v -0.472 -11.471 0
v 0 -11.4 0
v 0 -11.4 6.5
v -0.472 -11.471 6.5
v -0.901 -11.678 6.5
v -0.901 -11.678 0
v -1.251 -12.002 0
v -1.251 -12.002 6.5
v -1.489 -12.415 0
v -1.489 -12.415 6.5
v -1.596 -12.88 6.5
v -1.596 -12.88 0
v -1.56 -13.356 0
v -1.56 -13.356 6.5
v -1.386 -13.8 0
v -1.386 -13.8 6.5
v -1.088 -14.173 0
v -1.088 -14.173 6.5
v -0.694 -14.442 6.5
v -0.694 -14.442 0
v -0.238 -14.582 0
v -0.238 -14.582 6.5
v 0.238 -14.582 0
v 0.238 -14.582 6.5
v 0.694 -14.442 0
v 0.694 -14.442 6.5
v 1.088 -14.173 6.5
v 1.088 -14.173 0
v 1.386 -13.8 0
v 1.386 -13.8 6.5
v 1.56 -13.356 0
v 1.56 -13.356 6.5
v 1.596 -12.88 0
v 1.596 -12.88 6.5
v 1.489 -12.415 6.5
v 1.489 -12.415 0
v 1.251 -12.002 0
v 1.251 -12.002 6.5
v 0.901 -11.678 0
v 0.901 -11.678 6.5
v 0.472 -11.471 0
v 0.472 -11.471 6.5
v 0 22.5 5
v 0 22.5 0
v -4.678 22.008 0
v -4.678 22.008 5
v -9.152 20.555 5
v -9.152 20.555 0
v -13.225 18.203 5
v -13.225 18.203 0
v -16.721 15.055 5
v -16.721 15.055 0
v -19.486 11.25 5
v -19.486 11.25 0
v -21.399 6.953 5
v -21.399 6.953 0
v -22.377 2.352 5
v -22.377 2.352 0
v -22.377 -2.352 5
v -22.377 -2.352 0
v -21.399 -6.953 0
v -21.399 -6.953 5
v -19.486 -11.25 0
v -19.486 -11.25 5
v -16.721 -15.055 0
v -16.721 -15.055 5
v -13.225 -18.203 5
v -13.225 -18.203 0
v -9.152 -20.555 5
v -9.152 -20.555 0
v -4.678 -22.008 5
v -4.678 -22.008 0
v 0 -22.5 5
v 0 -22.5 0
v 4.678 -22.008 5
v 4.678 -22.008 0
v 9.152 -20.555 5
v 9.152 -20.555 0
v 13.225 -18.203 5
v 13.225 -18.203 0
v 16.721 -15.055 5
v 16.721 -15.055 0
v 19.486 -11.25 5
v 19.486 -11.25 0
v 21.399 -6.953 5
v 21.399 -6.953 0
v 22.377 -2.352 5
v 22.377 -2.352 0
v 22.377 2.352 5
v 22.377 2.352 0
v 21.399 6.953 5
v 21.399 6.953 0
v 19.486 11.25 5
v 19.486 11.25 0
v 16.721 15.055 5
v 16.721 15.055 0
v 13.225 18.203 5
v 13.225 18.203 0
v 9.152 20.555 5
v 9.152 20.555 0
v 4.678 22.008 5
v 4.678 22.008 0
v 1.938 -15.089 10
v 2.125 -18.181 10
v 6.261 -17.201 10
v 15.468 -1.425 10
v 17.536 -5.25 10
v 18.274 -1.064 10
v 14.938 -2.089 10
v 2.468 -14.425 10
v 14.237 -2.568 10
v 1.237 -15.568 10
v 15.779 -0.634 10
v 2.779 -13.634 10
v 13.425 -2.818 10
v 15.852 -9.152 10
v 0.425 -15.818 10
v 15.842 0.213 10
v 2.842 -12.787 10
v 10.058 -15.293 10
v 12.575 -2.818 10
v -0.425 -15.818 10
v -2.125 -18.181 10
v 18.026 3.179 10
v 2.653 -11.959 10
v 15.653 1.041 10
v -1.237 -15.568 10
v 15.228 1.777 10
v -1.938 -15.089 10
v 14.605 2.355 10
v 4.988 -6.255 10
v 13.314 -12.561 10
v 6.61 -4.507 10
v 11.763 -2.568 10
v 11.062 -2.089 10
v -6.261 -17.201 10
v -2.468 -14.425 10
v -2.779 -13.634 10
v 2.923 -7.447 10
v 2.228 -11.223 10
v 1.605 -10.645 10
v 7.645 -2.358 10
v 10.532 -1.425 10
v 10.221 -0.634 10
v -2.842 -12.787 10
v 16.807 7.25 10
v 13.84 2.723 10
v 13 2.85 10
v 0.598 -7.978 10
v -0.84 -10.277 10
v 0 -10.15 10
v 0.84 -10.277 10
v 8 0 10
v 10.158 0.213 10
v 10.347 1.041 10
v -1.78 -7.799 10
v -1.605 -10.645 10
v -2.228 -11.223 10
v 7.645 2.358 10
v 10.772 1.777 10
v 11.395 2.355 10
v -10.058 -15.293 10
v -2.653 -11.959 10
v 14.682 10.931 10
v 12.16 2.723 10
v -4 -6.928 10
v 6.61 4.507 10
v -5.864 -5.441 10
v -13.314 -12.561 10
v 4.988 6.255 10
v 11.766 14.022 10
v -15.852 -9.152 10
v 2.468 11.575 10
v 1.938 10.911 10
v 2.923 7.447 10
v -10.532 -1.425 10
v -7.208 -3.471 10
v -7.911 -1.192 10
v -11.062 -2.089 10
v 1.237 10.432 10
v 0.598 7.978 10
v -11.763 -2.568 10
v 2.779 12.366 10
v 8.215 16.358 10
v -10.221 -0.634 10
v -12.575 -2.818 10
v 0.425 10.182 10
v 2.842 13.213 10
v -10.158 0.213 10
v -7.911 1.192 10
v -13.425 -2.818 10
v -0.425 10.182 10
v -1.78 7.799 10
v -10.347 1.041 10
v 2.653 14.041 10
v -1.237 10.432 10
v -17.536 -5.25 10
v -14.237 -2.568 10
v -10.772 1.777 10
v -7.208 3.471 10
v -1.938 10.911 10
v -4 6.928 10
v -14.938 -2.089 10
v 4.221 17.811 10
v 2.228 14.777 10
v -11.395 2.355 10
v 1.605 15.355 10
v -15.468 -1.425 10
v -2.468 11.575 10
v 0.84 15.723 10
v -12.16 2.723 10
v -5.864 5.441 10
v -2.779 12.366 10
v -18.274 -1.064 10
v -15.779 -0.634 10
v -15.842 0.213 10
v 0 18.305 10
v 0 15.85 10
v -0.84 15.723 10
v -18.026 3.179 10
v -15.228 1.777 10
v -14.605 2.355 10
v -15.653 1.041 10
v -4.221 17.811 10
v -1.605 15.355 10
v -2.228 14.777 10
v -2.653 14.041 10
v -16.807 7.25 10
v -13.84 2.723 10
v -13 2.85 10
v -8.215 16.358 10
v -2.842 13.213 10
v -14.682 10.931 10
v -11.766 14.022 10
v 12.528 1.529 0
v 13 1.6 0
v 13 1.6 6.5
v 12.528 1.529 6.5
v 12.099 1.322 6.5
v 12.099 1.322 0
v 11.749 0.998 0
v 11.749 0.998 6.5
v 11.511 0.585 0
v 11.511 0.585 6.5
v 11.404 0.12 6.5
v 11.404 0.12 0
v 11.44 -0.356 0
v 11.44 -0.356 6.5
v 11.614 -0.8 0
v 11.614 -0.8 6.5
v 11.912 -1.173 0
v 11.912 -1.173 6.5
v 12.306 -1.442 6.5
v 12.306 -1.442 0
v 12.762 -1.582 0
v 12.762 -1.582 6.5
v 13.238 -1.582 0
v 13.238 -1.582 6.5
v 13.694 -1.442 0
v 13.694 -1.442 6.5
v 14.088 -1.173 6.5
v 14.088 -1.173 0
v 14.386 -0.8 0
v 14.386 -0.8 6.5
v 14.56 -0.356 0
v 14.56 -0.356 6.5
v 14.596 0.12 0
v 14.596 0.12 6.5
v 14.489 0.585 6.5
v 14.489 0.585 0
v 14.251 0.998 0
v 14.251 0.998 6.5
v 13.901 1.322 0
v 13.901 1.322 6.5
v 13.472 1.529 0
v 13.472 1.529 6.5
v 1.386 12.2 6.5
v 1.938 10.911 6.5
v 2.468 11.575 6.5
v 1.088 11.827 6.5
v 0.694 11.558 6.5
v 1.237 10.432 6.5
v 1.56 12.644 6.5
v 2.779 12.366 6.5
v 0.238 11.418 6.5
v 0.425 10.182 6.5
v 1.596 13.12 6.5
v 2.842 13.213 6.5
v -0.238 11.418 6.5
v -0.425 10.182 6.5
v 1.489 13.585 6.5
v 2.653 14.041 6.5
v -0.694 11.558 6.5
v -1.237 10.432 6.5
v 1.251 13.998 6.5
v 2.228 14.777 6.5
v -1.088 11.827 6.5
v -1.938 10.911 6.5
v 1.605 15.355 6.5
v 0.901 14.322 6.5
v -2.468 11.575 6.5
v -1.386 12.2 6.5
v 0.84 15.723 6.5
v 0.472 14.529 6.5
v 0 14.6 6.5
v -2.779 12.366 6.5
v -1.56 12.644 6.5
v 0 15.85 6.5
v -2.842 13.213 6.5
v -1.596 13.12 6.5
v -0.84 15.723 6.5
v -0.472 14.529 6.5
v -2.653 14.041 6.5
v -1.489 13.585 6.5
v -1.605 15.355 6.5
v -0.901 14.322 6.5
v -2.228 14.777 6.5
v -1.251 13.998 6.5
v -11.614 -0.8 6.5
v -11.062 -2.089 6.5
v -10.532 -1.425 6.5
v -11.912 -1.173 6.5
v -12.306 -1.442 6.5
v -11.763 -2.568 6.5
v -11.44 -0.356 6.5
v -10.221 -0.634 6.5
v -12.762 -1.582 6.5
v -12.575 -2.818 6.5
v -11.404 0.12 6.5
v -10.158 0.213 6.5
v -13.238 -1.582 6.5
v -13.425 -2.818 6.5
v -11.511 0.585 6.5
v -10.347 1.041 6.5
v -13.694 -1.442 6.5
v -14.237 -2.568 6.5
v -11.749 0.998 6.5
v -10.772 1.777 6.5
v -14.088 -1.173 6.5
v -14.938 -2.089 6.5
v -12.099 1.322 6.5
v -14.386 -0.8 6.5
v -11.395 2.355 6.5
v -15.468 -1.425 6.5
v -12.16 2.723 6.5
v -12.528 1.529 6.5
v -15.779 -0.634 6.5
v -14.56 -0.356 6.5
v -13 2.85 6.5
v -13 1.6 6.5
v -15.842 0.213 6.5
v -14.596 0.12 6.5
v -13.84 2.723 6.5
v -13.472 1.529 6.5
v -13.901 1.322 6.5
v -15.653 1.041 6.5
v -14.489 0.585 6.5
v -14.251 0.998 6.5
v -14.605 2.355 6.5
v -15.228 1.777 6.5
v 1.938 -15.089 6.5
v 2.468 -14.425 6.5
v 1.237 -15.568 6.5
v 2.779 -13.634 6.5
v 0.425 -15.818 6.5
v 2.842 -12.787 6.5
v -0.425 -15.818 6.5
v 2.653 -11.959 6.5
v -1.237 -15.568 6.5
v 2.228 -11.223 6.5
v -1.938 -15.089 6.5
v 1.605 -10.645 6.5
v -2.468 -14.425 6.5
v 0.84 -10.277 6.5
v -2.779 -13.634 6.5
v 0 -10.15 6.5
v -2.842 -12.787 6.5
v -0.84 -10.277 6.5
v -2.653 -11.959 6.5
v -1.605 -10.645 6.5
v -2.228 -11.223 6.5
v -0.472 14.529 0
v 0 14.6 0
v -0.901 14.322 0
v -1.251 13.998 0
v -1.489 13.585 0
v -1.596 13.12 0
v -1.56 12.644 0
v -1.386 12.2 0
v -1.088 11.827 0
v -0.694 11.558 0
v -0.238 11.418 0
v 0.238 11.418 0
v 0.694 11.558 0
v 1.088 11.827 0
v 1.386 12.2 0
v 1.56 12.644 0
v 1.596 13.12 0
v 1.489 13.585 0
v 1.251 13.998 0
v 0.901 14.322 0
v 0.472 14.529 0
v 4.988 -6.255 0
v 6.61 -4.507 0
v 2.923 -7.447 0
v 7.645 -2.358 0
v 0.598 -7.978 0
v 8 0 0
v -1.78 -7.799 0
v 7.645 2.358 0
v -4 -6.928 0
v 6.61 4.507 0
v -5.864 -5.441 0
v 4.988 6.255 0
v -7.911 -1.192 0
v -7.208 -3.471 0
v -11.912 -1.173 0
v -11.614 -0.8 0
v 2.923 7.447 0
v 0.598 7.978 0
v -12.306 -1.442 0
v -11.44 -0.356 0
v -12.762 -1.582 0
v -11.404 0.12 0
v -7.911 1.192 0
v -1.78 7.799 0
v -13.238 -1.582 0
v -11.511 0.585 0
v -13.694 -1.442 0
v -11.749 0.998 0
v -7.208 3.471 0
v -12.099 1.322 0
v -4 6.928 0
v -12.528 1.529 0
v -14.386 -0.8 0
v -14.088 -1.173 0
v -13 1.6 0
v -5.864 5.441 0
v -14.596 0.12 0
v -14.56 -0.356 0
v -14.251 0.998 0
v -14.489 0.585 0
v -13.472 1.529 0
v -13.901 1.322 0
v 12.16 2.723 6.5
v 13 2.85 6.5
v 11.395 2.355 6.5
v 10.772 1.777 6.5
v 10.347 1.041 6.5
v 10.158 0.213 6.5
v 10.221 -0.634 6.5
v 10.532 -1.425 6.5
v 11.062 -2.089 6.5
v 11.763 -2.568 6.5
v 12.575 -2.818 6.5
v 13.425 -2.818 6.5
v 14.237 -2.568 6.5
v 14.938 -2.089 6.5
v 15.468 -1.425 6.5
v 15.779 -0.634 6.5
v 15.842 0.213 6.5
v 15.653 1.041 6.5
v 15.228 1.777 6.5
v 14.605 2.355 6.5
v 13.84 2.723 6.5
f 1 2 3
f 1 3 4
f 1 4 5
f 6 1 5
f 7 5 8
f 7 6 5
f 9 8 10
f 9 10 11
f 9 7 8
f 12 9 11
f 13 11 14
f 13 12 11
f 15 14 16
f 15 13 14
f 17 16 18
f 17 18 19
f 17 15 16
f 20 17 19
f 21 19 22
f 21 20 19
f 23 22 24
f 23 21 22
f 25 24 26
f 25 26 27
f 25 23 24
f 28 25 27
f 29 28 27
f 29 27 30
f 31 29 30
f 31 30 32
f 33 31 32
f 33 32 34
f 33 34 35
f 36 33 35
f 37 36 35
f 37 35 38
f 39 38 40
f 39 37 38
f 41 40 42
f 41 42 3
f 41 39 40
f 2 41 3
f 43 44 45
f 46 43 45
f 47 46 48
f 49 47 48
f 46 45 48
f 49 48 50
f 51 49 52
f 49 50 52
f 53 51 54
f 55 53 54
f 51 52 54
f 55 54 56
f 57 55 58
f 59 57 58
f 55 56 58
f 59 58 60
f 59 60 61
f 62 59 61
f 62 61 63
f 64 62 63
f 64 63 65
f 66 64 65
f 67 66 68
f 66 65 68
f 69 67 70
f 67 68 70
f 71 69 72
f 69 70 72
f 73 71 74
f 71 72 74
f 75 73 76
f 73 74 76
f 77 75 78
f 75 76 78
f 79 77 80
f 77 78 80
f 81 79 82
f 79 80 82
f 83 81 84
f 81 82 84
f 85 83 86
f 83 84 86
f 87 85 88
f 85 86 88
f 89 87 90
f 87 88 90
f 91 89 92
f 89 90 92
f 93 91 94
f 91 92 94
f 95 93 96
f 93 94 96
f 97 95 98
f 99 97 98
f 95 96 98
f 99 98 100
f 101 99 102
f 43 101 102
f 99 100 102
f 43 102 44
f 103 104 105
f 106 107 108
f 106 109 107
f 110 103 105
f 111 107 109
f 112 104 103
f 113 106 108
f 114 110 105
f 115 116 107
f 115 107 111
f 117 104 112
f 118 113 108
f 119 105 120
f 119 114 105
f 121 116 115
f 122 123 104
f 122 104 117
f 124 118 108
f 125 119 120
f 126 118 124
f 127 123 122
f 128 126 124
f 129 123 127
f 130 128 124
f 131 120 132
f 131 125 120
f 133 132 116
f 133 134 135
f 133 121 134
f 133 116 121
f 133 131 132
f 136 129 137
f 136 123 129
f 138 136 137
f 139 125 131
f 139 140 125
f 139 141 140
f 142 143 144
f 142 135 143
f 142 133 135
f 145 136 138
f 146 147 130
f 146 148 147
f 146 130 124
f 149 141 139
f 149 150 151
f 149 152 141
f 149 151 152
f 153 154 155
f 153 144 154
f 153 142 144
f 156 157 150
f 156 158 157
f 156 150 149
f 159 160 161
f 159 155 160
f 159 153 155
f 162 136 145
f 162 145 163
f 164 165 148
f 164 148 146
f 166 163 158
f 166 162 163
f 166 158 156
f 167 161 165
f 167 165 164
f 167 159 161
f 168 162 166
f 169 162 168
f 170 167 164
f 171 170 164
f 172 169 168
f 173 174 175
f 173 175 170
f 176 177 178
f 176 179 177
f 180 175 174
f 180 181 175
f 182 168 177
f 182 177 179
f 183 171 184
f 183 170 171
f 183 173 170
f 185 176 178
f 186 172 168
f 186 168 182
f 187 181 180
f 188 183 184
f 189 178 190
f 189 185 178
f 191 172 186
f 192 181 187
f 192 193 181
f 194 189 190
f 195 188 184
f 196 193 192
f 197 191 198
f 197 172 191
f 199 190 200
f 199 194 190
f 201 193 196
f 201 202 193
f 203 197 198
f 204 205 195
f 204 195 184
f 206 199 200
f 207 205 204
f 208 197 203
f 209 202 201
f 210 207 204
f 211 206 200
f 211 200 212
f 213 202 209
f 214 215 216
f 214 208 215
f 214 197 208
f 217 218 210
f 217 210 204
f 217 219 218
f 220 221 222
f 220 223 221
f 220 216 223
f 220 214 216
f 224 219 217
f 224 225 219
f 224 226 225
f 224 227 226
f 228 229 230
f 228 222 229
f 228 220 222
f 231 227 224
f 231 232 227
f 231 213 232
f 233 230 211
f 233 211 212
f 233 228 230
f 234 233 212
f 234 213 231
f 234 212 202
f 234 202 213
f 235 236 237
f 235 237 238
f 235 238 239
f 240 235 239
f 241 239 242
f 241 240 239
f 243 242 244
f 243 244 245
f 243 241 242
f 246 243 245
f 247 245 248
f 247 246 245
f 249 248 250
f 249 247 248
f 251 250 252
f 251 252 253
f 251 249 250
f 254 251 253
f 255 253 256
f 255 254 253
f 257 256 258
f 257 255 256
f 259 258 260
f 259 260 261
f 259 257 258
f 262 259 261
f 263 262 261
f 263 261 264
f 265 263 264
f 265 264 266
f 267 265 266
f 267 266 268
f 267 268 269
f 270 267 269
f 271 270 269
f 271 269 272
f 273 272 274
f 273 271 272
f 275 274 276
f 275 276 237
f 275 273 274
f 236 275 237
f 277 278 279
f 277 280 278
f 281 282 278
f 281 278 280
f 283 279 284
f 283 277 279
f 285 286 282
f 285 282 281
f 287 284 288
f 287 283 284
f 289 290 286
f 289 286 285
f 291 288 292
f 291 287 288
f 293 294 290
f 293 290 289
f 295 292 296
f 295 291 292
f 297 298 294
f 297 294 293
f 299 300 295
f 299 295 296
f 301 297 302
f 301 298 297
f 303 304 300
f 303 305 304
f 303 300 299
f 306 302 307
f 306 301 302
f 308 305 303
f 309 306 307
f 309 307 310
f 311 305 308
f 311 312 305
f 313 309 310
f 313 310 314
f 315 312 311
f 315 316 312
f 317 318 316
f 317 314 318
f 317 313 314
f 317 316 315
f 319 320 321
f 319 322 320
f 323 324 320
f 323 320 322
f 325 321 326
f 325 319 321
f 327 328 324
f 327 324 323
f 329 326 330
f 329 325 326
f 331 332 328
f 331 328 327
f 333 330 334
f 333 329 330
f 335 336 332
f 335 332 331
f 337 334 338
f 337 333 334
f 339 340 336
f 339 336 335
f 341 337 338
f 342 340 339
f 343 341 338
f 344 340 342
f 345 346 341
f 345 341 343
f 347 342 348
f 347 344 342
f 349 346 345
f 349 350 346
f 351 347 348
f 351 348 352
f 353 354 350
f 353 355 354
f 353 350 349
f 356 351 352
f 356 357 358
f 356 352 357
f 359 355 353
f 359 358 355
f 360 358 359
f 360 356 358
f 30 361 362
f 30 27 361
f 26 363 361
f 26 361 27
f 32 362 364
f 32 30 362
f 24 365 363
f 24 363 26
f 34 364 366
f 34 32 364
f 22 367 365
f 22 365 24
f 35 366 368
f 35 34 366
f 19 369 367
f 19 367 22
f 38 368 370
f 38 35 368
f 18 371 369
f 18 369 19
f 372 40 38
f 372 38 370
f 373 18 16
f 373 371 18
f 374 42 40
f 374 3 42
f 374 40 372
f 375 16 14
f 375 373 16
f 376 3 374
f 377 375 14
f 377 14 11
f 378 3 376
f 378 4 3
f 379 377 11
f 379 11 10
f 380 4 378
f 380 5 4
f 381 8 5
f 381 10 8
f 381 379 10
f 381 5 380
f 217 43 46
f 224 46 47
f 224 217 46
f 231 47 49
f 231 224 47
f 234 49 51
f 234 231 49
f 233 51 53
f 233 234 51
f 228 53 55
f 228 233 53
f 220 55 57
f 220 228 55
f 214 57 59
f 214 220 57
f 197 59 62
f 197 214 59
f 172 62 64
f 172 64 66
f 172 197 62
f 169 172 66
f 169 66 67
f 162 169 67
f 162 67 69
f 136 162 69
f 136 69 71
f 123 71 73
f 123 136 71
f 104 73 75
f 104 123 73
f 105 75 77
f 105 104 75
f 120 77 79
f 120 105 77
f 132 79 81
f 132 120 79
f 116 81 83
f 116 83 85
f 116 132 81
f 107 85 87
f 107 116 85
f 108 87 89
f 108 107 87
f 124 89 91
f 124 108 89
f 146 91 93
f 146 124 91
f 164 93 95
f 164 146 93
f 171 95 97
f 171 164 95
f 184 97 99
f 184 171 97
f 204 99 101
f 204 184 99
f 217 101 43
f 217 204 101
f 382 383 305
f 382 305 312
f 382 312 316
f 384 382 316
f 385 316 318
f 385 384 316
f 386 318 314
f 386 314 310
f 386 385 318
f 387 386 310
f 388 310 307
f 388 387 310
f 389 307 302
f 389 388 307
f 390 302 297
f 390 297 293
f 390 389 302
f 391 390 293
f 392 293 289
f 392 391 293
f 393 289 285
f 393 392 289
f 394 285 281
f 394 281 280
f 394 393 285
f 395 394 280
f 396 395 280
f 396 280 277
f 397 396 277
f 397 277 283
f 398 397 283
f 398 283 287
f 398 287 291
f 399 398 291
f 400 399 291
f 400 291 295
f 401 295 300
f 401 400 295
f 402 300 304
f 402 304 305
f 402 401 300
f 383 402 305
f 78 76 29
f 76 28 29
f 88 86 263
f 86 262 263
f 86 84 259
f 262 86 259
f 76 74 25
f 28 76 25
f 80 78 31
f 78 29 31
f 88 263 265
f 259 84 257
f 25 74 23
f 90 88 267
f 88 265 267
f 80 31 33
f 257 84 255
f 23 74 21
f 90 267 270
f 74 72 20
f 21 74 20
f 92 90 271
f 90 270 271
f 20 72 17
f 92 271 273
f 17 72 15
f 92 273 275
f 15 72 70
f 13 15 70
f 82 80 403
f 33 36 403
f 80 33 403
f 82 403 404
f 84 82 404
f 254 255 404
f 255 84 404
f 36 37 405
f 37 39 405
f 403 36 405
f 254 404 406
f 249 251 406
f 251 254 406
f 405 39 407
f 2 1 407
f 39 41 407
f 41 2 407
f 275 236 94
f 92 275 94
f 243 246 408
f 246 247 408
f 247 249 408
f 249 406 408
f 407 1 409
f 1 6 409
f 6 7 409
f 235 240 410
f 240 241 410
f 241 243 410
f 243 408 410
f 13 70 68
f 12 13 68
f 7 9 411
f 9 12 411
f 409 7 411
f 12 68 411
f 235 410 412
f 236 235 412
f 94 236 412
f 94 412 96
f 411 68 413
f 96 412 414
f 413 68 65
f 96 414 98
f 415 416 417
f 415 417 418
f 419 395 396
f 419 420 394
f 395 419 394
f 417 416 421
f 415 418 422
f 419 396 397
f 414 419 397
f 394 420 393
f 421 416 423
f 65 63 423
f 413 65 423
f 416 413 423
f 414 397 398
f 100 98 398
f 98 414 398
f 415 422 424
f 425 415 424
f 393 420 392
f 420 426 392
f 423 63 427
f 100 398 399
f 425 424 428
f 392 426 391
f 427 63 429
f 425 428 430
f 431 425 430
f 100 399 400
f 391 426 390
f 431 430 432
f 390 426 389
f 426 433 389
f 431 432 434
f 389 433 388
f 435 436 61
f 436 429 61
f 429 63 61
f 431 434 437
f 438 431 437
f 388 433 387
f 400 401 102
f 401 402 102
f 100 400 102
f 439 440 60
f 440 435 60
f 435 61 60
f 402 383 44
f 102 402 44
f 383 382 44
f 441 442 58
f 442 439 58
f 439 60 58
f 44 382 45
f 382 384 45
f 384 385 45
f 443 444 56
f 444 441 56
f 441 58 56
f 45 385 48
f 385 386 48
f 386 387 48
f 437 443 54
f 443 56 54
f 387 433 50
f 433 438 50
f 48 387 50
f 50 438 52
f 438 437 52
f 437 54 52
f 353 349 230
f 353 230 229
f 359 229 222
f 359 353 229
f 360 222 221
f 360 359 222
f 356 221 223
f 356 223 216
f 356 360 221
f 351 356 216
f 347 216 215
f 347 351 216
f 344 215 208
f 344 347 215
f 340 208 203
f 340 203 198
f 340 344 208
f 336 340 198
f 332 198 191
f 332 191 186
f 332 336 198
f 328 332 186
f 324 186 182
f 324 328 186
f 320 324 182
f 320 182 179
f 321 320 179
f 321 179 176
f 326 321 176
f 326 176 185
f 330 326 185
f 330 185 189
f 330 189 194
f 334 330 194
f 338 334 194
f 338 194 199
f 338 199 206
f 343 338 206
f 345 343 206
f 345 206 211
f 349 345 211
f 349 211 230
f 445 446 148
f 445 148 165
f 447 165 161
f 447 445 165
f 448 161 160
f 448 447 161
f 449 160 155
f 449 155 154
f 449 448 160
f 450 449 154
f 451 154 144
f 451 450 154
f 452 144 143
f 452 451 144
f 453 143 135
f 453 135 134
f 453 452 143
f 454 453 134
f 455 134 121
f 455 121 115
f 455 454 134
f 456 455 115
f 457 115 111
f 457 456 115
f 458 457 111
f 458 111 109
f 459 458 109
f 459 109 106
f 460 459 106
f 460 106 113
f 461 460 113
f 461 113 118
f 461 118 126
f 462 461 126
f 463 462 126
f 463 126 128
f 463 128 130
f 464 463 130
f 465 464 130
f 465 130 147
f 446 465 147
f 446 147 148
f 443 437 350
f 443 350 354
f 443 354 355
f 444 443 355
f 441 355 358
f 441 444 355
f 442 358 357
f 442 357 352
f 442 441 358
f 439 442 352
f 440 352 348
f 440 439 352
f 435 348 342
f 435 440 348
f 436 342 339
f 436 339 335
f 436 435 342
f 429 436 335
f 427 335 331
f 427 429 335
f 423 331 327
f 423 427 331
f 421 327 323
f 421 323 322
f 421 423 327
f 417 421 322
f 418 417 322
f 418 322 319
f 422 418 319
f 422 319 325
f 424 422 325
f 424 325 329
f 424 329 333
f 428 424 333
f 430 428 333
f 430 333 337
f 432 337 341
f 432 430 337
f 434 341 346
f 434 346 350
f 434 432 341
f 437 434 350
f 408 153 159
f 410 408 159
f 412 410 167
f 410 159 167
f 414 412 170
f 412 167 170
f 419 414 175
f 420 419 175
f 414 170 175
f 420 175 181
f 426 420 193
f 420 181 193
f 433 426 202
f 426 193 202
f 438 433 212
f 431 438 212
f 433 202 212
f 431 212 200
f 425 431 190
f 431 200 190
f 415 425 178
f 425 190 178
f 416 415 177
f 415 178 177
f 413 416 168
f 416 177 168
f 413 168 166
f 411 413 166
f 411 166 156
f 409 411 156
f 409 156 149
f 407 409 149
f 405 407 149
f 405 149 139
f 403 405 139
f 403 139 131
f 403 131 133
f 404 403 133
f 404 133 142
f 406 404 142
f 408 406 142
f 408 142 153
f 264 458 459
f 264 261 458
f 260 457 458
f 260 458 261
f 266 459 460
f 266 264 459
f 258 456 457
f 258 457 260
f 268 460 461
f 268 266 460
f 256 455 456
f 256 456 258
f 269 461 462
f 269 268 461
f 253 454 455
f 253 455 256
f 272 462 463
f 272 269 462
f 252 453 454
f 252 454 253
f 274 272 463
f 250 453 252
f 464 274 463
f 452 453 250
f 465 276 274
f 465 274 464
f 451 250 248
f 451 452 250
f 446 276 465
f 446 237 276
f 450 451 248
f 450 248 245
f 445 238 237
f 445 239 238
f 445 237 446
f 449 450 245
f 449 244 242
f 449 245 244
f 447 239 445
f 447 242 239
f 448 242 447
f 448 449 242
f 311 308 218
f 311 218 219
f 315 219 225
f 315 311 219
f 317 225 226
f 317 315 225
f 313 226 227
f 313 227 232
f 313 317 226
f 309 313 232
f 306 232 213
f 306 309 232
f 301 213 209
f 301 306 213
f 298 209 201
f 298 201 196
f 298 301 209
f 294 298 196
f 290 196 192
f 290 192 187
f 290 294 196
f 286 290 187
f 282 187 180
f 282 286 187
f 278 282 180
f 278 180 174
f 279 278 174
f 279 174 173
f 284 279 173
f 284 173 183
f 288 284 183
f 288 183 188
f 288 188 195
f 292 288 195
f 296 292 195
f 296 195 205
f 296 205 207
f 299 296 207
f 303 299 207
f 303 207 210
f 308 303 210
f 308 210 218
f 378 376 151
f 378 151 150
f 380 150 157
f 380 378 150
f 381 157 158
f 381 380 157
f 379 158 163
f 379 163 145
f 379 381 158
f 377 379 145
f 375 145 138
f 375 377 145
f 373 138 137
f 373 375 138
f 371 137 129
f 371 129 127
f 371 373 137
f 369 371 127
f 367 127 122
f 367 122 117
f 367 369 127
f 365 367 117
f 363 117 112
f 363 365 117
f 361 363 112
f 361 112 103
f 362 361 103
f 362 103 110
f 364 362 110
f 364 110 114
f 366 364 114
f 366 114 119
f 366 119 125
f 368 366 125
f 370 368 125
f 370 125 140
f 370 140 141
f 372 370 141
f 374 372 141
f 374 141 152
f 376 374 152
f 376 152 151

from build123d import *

# Parameters (mm, degrees)
SKETCH1_R               = 22.5
SKETCH1_R_2             = 2.85
BOSS_EXTRUDE1_DEPTH     = 10
SKETCH1_3_R             = 2.85
SKETCH1_3_R_2           = 1.6
BOSS_EXTRUDE2_DEPTH     = 6.5
CHAMFER1_SIZE           = 5
CHAMFER1_SIZE2          = 4.195498156
SKETCH2_R               = 8
CUT_EXTRUDE1_DEPTH      = 1
CUT_EXTRUDE1_DEPTH_BACK = 11


with BuildPart() as part:
    # Sketch1 → Boss-Extrude1 (new body)
    with BuildSketch(Plane(origin=(0, 0, 0), x_dir=(0, 1, 0), z_dir=(0, 0, 1))):
        Circle(SKETCH1_R)
        with Locations((-13, 0)):
            Circle(SKETCH1_R_2, mode=Mode.SUBTRACT)
        with Locations((0, -13)):
            Circle(SKETCH1_R_2, mode=Mode.SUBTRACT)
        with Locations((13, 0)):
            Circle(SKETCH1_R_2, mode=Mode.SUBTRACT)
        with Locations((0, 13)):
            Circle(SKETCH1_R_2, mode=Mode.SUBTRACT)
    extrude(amount=BOSS_EXTRUDE1_DEPTH)

    # Sketch1<3> → Boss-Extrude2 (add)
    with BuildSketch(Plane(origin=(0, 0, 0), x_dir=(0, 1, 0), z_dir=(0, 0, 1))):
        with Locations((-13, 0)):
            Circle(SKETCH1_3_R)
        with Locations((-13, 0)):
            Circle(SKETCH1_3_R_2, mode=Mode.SUBTRACT)
        with Locations((0, 13)):
            Circle(SKETCH1_3_R)
        with Locations((0, 13)):
            Circle(SKETCH1_3_R_2, mode=Mode.SUBTRACT)
        with Locations((13, 0)):
            Circle(SKETCH1_3_R)
        with Locations((13, 0)):
            Circle(SKETCH1_3_R_2, mode=Mode.SUBTRACT)
        with Locations((0, -13)):
            Circle(SKETCH1_3_R)
        with Locations((0, -13)):
            Circle(SKETCH1_3_R_2, mode=Mode.SUBTRACT)
    extrude(amount=BOSS_EXTRUDE2_DEPTH)

    # Chamfer1
    chamfer1_edges = [part.edges().sort_by_distance(p)[0] for p in [
        (0, -22.5, 10),
    ]]
    chamfer1_side = [part.faces().sort_by_distance(p)[0] for p in [
        (0, -22.5, 5),
    ]]
    chamfer(chamfer1_edges, length=CHAMFER1_SIZE, length2=CHAMFER1_SIZE2, reference=chamfer1_side[0])

    # Sketch2 → Cut-Extrude1 (cut, two sides)
    with BuildSketch(Plane.XY.offset(10)) as cut_extrude1_sk:
        Circle(SKETCH2_R)
    extrude(amount=CUT_EXTRUDE1_DEPTH, mode=Mode.SUBTRACT)
    extrude(cut_extrude1_sk.sketch, amount=-CUT_EXTRUDE1_DEPTH_BACK, mode=Mode.SUBTRACT)


solid = part.part
